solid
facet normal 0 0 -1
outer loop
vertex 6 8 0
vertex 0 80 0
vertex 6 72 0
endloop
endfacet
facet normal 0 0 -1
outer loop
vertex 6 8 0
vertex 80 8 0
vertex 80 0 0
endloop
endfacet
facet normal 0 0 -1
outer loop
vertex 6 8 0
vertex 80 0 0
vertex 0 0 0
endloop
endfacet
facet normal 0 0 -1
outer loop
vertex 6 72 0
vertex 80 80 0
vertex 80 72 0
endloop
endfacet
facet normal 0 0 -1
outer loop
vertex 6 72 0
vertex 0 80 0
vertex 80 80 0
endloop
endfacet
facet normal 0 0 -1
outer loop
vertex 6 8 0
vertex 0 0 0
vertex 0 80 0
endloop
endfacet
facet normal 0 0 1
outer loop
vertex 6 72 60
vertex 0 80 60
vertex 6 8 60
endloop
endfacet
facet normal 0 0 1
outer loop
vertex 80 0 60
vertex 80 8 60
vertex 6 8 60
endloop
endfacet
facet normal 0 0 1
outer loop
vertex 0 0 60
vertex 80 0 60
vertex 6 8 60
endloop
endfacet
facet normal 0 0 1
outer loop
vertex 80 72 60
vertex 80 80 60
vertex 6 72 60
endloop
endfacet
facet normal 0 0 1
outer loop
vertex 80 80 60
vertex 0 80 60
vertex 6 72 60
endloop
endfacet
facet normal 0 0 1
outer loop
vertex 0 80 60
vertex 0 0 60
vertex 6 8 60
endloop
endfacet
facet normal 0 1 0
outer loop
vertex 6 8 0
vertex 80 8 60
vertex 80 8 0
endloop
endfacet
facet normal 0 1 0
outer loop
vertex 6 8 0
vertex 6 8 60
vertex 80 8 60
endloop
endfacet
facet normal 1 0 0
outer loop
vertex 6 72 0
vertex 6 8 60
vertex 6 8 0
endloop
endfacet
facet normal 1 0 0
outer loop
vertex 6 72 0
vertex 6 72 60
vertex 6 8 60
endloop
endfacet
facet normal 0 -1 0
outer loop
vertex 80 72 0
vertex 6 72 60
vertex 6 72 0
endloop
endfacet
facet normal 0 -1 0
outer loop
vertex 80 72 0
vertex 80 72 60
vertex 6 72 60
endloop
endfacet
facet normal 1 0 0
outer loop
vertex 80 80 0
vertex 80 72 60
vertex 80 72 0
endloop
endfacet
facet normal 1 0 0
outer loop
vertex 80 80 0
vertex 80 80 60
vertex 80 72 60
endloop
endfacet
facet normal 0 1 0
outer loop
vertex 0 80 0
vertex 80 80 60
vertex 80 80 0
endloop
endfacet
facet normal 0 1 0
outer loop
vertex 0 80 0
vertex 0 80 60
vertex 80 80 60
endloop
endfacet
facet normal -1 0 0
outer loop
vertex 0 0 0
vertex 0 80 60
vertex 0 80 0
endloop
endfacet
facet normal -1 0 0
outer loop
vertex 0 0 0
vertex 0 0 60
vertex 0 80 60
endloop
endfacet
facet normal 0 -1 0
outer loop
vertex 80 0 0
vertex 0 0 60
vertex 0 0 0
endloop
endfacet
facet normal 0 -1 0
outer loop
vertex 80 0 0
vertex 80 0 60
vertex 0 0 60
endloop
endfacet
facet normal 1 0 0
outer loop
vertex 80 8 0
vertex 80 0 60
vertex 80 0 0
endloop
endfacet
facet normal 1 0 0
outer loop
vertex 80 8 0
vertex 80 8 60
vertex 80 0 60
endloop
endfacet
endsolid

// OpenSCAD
$fn = 32;

// ----------------------------------------------------------------------
// Structural section: channel 80 x 80 mm
// ----------------------------------------------------------------------

// --- parameters (mm) ---
sec_w = 80;               // channel width, X
sec_h = 80;               // channel height, Y
flange_t = 8;             // flange thickness
web_t = 6;                // web thickness
plate_t = 60;             // cut length, Z (extrusion height)
fit_tol = 0.02;           // declared fit tolerance (prompt contract)
free_tol = 0.2;           // declared free tolerance (prompt contract)

profile = [[0, 0], [80, 0], [80, 8], [6, 8], [6, 72], [80, 72], [80, 80], [0, 80]];  // primary outline, 8 points, counter clockwise

// --- the one profile operation ---
linear_extrude(height = plate_t) polygon(points = profile);
